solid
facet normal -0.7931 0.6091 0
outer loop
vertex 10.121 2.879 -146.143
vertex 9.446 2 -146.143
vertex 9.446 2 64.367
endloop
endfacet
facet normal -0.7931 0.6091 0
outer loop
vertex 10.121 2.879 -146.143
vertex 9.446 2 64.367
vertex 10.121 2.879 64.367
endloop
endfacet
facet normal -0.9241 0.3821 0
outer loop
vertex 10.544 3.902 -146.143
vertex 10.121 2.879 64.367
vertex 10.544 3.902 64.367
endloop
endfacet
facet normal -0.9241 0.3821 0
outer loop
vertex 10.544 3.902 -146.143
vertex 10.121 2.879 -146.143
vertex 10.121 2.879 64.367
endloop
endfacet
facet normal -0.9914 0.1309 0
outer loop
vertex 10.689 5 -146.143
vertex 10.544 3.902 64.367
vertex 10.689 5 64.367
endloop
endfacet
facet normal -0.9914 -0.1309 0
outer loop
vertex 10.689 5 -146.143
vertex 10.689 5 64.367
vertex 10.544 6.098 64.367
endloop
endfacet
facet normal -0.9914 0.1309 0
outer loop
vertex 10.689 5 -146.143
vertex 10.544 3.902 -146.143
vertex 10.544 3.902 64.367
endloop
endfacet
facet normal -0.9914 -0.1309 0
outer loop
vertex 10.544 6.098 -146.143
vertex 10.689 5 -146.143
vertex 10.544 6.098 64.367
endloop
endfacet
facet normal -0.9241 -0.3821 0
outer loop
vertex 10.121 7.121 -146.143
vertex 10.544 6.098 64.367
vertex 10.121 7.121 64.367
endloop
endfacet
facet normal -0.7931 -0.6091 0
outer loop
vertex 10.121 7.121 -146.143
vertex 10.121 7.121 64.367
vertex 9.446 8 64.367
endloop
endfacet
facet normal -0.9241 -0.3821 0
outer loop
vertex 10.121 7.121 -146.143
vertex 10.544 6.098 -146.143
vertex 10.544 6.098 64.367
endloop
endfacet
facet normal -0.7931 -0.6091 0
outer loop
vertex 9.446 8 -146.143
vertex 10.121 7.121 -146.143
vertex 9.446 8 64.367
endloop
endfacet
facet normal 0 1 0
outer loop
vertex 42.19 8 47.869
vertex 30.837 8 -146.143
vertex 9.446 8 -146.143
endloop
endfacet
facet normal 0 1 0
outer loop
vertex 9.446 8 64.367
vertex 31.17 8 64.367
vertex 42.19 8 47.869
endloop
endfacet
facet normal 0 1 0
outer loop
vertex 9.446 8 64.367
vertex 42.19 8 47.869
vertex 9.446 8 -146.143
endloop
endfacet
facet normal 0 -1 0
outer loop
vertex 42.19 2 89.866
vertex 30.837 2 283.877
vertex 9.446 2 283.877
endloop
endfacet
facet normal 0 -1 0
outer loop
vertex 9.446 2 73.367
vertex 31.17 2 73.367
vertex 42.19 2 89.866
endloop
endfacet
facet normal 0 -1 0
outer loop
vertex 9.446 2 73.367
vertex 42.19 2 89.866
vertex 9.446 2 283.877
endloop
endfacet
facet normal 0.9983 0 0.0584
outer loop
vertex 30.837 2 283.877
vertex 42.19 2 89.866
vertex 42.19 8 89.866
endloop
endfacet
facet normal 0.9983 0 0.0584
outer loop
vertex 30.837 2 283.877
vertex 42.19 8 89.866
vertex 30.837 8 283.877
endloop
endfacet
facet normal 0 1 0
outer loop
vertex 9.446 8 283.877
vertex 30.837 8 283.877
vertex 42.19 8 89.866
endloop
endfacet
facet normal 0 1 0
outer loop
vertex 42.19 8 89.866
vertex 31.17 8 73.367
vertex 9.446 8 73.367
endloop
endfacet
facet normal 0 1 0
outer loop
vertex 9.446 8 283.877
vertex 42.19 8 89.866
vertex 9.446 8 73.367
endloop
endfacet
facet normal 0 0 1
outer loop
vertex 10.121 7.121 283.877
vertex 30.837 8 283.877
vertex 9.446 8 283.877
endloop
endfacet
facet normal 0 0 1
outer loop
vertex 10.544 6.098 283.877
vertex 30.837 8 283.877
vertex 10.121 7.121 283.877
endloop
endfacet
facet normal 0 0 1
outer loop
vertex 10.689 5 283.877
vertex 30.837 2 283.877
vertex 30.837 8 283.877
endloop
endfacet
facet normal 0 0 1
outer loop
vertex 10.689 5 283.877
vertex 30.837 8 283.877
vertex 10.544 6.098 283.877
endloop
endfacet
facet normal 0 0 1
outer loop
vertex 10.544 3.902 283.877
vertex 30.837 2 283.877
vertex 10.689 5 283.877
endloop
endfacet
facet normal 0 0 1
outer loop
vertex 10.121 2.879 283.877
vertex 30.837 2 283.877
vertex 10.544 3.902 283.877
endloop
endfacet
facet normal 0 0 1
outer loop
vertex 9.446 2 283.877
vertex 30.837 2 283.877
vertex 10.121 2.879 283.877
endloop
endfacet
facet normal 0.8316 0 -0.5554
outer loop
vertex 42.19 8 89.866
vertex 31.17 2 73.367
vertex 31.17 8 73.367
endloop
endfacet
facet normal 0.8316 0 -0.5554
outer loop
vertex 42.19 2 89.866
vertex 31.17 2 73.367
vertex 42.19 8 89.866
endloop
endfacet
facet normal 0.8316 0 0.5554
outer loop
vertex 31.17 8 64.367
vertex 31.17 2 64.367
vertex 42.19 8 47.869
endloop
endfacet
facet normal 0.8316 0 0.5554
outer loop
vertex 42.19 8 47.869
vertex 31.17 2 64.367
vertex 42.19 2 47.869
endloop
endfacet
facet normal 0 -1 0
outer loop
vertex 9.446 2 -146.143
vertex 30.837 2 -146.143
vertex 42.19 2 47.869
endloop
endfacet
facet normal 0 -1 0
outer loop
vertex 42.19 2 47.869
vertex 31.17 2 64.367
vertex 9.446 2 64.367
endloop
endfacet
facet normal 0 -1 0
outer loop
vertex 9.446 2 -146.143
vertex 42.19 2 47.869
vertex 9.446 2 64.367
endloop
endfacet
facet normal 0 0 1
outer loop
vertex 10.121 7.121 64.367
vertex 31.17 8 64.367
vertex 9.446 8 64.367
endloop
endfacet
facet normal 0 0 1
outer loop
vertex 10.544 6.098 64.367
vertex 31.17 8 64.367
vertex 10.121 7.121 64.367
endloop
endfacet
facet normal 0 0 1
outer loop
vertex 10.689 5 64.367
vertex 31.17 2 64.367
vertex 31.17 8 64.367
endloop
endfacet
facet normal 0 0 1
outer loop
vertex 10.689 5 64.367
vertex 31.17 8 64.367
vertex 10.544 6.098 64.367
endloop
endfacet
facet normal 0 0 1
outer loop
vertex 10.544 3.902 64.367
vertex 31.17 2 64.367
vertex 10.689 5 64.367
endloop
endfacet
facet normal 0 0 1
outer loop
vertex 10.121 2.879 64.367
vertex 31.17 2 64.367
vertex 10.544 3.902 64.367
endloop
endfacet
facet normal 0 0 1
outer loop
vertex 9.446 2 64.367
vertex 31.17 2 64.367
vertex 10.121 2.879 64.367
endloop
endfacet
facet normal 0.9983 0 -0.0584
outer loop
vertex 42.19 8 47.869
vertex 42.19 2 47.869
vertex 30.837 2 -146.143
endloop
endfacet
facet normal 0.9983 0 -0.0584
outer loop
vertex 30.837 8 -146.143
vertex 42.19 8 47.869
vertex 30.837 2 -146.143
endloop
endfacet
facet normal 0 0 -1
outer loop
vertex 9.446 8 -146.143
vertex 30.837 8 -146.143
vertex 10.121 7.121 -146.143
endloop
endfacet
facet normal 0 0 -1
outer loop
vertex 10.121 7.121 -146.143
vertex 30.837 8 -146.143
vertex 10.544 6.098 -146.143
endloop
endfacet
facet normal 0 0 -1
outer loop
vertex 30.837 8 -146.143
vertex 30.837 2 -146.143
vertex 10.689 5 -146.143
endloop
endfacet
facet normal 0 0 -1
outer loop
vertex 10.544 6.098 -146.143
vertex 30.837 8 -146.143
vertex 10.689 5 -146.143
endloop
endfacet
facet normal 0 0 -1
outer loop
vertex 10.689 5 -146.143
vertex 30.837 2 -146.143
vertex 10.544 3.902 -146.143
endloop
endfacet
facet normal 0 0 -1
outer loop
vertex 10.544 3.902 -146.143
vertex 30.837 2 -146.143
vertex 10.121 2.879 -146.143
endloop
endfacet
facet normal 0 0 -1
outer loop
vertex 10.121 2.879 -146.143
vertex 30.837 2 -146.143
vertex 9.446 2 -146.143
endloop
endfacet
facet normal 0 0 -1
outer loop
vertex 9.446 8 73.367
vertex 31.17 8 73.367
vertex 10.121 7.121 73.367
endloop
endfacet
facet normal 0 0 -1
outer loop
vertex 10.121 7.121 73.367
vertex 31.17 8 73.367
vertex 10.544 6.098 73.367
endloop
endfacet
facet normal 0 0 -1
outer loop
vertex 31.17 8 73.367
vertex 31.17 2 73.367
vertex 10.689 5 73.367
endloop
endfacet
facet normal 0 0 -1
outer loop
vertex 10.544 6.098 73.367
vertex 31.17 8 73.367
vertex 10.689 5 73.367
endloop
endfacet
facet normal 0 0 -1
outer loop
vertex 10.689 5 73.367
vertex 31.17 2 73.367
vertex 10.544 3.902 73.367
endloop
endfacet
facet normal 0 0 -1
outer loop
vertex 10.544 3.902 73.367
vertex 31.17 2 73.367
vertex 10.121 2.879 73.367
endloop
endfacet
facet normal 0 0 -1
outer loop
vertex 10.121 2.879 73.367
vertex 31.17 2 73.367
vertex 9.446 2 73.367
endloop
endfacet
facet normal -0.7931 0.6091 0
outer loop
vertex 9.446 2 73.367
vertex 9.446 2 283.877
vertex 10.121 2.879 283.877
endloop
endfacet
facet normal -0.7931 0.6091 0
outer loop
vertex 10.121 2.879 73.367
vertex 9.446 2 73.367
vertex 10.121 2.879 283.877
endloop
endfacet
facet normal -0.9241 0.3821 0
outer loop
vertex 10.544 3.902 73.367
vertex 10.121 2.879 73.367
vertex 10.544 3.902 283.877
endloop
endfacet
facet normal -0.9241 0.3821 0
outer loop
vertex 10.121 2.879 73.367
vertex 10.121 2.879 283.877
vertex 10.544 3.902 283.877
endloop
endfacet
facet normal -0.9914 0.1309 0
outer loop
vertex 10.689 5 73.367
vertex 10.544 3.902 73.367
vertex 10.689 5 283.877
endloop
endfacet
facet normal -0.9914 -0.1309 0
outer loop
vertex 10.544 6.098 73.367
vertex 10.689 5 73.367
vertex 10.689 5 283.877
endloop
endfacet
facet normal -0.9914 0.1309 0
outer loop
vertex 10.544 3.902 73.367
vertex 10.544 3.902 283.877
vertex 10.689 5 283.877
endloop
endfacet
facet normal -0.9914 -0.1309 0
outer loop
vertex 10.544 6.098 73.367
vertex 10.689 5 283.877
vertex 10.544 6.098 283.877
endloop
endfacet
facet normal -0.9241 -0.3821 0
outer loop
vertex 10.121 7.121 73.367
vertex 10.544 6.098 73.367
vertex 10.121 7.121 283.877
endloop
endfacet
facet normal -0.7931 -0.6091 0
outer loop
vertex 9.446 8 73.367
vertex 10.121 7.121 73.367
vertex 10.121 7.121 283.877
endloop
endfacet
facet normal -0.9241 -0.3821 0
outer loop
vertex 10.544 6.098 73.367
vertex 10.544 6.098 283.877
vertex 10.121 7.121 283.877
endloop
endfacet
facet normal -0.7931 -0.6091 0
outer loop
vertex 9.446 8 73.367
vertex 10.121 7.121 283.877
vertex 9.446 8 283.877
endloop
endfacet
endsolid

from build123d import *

# Parameters (mm, degrees)
BOSS_EXTRUDE1_DEPTH = 10
CUT_EXTRUDE1_DEPTH  = 356.209628619
SCALE3_SCALE        = 0.6


with BuildPart() as part:
    # Sketch1 → Boss-Extrude1 (new body)
    with BuildSketch(Plane(origin=(0, 0, 0), x_dir=(1, 0, 0), z_dir=(0, 1, 0))):
        Polygon((35.650600343, -358.35), (0, -358.35), (0, -7.5), (20.180404561, -7.5), (36.205984401, -7.5), (54.572500068, -34.997934227), align=None)
    extrude(amount=BOSS_EXTRUDE1_DEPTH)

    # Sketch2 → Cut-Extrude1 (cut, through all)
    with BuildSketch(Plane.XY.offset(358.35)):
        with BuildLine():
            Line((0, 10), (0, 0))
            ThreePointArc((0, 0), (2.071067812, 5), (0, 10))
        make_face()
    extrude(amount=-CUT_EXTRUDE1_DEPTH, mode=Mode.SUBTRACT)


with BuildPart() as part_1:
    # Scale3: scaled about (23.615874951, 5, 172.168463309)
    add(part.part.scale(SCALE3_SCALE).moved(Location((9.44634998, 2, 68.867385324))))


with BuildPart() as body_2:
    # Mirror3: mirrored copy
    add(part_1.part.mirror(Plane(origin=(0, 0, 68.867385324), x_dir=(1, 0, 0), z_dir=(0, 0, -1))))


solid = Compound([part_1.part, body_2.part])
